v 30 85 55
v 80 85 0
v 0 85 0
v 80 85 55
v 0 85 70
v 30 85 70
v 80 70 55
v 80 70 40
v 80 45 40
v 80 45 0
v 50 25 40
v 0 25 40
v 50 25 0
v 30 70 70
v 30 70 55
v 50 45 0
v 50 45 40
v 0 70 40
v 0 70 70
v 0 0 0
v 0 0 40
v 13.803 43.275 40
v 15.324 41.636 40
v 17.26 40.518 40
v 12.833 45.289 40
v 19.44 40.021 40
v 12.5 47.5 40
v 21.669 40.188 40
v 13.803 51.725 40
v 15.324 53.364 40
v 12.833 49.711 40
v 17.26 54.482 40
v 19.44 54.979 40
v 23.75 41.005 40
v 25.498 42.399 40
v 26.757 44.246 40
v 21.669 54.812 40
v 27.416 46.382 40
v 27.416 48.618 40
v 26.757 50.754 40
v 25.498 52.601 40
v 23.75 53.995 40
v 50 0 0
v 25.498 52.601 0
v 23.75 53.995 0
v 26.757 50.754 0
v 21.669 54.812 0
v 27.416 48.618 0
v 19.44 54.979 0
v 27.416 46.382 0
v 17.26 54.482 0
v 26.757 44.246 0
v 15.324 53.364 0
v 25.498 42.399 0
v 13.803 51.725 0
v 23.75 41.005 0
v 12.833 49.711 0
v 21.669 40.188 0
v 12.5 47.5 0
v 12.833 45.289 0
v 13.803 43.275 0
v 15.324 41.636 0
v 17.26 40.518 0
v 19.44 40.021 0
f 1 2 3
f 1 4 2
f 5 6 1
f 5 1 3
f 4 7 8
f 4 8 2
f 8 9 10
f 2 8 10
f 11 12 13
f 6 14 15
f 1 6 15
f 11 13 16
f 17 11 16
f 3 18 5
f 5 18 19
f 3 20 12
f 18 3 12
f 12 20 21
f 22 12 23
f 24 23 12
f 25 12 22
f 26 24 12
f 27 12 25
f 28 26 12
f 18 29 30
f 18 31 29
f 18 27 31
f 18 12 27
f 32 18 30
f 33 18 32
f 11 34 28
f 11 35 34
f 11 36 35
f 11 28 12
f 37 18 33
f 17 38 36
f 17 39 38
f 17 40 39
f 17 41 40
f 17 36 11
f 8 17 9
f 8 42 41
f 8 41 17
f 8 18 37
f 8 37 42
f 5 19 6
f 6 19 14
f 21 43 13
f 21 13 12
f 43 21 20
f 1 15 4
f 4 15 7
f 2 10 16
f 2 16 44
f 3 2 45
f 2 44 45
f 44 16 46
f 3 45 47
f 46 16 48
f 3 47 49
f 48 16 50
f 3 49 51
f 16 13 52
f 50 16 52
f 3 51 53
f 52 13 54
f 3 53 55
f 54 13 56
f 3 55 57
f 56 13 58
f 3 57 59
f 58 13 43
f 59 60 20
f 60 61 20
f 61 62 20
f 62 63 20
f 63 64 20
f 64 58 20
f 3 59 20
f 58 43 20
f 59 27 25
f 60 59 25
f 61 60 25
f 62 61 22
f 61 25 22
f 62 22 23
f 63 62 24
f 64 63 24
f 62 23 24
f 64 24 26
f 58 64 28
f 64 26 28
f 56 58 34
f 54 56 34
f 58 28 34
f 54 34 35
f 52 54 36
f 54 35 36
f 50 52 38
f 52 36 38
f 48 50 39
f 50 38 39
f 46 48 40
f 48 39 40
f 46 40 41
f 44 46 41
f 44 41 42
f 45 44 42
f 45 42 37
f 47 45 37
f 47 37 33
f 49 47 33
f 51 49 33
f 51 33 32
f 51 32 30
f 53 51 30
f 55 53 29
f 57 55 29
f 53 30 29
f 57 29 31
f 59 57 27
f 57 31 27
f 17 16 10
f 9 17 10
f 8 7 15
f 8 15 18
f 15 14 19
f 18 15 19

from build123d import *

# Parameters (mm, degrees)
F1_DEPTH = 25
F3_DEPTH = 40
F5_DEPTH = 15
F7_DEPTH = 40


with BuildPart() as f1:
    # F0 (on Front) → F1 (new body)
    with BuildSketch(Plane.XZ):
        Polygon((0, 40), (0, 0), (50, 0), align=None)
    extrude(amount=-F1_DEPTH)

    # F2 (on Top) → F3 (join)
    with BuildSketch(Plane.XY):
        Polygon((0, 70), (0, 25), (50, 25), (50, 45), (80, 45), (80, 70), align=None)
    extrude(amount=F3_DEPTH)

    # F4 (on face) → F5 (join)
    with BuildSketch(Plane(origin=(0, 70, 0), x_dir=(-1, 0, 0), z_dir=(0, 1, 0))):
        Polygon((-80, 0), (0, 0), (0, 70), (-30, 70), (-30, 55), (-80, 55), (-80, 40), align=None)
    extrude(amount=F5_DEPTH)

    # F6 (on face) → F7 (cut)
    with BuildSketch(Plane.XY.offset(40)):
        with BuildLine():
            ThreePointArc((27.5, 47.5), (20, 55), (12.5, 47.5))
            ThreePointArc((12.5, 47.5), (20, 40), (27.5, 47.5))
        make_face()
    extrude(amount=-F7_DEPTH, mode=Mode.SUBTRACT)


solid = f1.part
